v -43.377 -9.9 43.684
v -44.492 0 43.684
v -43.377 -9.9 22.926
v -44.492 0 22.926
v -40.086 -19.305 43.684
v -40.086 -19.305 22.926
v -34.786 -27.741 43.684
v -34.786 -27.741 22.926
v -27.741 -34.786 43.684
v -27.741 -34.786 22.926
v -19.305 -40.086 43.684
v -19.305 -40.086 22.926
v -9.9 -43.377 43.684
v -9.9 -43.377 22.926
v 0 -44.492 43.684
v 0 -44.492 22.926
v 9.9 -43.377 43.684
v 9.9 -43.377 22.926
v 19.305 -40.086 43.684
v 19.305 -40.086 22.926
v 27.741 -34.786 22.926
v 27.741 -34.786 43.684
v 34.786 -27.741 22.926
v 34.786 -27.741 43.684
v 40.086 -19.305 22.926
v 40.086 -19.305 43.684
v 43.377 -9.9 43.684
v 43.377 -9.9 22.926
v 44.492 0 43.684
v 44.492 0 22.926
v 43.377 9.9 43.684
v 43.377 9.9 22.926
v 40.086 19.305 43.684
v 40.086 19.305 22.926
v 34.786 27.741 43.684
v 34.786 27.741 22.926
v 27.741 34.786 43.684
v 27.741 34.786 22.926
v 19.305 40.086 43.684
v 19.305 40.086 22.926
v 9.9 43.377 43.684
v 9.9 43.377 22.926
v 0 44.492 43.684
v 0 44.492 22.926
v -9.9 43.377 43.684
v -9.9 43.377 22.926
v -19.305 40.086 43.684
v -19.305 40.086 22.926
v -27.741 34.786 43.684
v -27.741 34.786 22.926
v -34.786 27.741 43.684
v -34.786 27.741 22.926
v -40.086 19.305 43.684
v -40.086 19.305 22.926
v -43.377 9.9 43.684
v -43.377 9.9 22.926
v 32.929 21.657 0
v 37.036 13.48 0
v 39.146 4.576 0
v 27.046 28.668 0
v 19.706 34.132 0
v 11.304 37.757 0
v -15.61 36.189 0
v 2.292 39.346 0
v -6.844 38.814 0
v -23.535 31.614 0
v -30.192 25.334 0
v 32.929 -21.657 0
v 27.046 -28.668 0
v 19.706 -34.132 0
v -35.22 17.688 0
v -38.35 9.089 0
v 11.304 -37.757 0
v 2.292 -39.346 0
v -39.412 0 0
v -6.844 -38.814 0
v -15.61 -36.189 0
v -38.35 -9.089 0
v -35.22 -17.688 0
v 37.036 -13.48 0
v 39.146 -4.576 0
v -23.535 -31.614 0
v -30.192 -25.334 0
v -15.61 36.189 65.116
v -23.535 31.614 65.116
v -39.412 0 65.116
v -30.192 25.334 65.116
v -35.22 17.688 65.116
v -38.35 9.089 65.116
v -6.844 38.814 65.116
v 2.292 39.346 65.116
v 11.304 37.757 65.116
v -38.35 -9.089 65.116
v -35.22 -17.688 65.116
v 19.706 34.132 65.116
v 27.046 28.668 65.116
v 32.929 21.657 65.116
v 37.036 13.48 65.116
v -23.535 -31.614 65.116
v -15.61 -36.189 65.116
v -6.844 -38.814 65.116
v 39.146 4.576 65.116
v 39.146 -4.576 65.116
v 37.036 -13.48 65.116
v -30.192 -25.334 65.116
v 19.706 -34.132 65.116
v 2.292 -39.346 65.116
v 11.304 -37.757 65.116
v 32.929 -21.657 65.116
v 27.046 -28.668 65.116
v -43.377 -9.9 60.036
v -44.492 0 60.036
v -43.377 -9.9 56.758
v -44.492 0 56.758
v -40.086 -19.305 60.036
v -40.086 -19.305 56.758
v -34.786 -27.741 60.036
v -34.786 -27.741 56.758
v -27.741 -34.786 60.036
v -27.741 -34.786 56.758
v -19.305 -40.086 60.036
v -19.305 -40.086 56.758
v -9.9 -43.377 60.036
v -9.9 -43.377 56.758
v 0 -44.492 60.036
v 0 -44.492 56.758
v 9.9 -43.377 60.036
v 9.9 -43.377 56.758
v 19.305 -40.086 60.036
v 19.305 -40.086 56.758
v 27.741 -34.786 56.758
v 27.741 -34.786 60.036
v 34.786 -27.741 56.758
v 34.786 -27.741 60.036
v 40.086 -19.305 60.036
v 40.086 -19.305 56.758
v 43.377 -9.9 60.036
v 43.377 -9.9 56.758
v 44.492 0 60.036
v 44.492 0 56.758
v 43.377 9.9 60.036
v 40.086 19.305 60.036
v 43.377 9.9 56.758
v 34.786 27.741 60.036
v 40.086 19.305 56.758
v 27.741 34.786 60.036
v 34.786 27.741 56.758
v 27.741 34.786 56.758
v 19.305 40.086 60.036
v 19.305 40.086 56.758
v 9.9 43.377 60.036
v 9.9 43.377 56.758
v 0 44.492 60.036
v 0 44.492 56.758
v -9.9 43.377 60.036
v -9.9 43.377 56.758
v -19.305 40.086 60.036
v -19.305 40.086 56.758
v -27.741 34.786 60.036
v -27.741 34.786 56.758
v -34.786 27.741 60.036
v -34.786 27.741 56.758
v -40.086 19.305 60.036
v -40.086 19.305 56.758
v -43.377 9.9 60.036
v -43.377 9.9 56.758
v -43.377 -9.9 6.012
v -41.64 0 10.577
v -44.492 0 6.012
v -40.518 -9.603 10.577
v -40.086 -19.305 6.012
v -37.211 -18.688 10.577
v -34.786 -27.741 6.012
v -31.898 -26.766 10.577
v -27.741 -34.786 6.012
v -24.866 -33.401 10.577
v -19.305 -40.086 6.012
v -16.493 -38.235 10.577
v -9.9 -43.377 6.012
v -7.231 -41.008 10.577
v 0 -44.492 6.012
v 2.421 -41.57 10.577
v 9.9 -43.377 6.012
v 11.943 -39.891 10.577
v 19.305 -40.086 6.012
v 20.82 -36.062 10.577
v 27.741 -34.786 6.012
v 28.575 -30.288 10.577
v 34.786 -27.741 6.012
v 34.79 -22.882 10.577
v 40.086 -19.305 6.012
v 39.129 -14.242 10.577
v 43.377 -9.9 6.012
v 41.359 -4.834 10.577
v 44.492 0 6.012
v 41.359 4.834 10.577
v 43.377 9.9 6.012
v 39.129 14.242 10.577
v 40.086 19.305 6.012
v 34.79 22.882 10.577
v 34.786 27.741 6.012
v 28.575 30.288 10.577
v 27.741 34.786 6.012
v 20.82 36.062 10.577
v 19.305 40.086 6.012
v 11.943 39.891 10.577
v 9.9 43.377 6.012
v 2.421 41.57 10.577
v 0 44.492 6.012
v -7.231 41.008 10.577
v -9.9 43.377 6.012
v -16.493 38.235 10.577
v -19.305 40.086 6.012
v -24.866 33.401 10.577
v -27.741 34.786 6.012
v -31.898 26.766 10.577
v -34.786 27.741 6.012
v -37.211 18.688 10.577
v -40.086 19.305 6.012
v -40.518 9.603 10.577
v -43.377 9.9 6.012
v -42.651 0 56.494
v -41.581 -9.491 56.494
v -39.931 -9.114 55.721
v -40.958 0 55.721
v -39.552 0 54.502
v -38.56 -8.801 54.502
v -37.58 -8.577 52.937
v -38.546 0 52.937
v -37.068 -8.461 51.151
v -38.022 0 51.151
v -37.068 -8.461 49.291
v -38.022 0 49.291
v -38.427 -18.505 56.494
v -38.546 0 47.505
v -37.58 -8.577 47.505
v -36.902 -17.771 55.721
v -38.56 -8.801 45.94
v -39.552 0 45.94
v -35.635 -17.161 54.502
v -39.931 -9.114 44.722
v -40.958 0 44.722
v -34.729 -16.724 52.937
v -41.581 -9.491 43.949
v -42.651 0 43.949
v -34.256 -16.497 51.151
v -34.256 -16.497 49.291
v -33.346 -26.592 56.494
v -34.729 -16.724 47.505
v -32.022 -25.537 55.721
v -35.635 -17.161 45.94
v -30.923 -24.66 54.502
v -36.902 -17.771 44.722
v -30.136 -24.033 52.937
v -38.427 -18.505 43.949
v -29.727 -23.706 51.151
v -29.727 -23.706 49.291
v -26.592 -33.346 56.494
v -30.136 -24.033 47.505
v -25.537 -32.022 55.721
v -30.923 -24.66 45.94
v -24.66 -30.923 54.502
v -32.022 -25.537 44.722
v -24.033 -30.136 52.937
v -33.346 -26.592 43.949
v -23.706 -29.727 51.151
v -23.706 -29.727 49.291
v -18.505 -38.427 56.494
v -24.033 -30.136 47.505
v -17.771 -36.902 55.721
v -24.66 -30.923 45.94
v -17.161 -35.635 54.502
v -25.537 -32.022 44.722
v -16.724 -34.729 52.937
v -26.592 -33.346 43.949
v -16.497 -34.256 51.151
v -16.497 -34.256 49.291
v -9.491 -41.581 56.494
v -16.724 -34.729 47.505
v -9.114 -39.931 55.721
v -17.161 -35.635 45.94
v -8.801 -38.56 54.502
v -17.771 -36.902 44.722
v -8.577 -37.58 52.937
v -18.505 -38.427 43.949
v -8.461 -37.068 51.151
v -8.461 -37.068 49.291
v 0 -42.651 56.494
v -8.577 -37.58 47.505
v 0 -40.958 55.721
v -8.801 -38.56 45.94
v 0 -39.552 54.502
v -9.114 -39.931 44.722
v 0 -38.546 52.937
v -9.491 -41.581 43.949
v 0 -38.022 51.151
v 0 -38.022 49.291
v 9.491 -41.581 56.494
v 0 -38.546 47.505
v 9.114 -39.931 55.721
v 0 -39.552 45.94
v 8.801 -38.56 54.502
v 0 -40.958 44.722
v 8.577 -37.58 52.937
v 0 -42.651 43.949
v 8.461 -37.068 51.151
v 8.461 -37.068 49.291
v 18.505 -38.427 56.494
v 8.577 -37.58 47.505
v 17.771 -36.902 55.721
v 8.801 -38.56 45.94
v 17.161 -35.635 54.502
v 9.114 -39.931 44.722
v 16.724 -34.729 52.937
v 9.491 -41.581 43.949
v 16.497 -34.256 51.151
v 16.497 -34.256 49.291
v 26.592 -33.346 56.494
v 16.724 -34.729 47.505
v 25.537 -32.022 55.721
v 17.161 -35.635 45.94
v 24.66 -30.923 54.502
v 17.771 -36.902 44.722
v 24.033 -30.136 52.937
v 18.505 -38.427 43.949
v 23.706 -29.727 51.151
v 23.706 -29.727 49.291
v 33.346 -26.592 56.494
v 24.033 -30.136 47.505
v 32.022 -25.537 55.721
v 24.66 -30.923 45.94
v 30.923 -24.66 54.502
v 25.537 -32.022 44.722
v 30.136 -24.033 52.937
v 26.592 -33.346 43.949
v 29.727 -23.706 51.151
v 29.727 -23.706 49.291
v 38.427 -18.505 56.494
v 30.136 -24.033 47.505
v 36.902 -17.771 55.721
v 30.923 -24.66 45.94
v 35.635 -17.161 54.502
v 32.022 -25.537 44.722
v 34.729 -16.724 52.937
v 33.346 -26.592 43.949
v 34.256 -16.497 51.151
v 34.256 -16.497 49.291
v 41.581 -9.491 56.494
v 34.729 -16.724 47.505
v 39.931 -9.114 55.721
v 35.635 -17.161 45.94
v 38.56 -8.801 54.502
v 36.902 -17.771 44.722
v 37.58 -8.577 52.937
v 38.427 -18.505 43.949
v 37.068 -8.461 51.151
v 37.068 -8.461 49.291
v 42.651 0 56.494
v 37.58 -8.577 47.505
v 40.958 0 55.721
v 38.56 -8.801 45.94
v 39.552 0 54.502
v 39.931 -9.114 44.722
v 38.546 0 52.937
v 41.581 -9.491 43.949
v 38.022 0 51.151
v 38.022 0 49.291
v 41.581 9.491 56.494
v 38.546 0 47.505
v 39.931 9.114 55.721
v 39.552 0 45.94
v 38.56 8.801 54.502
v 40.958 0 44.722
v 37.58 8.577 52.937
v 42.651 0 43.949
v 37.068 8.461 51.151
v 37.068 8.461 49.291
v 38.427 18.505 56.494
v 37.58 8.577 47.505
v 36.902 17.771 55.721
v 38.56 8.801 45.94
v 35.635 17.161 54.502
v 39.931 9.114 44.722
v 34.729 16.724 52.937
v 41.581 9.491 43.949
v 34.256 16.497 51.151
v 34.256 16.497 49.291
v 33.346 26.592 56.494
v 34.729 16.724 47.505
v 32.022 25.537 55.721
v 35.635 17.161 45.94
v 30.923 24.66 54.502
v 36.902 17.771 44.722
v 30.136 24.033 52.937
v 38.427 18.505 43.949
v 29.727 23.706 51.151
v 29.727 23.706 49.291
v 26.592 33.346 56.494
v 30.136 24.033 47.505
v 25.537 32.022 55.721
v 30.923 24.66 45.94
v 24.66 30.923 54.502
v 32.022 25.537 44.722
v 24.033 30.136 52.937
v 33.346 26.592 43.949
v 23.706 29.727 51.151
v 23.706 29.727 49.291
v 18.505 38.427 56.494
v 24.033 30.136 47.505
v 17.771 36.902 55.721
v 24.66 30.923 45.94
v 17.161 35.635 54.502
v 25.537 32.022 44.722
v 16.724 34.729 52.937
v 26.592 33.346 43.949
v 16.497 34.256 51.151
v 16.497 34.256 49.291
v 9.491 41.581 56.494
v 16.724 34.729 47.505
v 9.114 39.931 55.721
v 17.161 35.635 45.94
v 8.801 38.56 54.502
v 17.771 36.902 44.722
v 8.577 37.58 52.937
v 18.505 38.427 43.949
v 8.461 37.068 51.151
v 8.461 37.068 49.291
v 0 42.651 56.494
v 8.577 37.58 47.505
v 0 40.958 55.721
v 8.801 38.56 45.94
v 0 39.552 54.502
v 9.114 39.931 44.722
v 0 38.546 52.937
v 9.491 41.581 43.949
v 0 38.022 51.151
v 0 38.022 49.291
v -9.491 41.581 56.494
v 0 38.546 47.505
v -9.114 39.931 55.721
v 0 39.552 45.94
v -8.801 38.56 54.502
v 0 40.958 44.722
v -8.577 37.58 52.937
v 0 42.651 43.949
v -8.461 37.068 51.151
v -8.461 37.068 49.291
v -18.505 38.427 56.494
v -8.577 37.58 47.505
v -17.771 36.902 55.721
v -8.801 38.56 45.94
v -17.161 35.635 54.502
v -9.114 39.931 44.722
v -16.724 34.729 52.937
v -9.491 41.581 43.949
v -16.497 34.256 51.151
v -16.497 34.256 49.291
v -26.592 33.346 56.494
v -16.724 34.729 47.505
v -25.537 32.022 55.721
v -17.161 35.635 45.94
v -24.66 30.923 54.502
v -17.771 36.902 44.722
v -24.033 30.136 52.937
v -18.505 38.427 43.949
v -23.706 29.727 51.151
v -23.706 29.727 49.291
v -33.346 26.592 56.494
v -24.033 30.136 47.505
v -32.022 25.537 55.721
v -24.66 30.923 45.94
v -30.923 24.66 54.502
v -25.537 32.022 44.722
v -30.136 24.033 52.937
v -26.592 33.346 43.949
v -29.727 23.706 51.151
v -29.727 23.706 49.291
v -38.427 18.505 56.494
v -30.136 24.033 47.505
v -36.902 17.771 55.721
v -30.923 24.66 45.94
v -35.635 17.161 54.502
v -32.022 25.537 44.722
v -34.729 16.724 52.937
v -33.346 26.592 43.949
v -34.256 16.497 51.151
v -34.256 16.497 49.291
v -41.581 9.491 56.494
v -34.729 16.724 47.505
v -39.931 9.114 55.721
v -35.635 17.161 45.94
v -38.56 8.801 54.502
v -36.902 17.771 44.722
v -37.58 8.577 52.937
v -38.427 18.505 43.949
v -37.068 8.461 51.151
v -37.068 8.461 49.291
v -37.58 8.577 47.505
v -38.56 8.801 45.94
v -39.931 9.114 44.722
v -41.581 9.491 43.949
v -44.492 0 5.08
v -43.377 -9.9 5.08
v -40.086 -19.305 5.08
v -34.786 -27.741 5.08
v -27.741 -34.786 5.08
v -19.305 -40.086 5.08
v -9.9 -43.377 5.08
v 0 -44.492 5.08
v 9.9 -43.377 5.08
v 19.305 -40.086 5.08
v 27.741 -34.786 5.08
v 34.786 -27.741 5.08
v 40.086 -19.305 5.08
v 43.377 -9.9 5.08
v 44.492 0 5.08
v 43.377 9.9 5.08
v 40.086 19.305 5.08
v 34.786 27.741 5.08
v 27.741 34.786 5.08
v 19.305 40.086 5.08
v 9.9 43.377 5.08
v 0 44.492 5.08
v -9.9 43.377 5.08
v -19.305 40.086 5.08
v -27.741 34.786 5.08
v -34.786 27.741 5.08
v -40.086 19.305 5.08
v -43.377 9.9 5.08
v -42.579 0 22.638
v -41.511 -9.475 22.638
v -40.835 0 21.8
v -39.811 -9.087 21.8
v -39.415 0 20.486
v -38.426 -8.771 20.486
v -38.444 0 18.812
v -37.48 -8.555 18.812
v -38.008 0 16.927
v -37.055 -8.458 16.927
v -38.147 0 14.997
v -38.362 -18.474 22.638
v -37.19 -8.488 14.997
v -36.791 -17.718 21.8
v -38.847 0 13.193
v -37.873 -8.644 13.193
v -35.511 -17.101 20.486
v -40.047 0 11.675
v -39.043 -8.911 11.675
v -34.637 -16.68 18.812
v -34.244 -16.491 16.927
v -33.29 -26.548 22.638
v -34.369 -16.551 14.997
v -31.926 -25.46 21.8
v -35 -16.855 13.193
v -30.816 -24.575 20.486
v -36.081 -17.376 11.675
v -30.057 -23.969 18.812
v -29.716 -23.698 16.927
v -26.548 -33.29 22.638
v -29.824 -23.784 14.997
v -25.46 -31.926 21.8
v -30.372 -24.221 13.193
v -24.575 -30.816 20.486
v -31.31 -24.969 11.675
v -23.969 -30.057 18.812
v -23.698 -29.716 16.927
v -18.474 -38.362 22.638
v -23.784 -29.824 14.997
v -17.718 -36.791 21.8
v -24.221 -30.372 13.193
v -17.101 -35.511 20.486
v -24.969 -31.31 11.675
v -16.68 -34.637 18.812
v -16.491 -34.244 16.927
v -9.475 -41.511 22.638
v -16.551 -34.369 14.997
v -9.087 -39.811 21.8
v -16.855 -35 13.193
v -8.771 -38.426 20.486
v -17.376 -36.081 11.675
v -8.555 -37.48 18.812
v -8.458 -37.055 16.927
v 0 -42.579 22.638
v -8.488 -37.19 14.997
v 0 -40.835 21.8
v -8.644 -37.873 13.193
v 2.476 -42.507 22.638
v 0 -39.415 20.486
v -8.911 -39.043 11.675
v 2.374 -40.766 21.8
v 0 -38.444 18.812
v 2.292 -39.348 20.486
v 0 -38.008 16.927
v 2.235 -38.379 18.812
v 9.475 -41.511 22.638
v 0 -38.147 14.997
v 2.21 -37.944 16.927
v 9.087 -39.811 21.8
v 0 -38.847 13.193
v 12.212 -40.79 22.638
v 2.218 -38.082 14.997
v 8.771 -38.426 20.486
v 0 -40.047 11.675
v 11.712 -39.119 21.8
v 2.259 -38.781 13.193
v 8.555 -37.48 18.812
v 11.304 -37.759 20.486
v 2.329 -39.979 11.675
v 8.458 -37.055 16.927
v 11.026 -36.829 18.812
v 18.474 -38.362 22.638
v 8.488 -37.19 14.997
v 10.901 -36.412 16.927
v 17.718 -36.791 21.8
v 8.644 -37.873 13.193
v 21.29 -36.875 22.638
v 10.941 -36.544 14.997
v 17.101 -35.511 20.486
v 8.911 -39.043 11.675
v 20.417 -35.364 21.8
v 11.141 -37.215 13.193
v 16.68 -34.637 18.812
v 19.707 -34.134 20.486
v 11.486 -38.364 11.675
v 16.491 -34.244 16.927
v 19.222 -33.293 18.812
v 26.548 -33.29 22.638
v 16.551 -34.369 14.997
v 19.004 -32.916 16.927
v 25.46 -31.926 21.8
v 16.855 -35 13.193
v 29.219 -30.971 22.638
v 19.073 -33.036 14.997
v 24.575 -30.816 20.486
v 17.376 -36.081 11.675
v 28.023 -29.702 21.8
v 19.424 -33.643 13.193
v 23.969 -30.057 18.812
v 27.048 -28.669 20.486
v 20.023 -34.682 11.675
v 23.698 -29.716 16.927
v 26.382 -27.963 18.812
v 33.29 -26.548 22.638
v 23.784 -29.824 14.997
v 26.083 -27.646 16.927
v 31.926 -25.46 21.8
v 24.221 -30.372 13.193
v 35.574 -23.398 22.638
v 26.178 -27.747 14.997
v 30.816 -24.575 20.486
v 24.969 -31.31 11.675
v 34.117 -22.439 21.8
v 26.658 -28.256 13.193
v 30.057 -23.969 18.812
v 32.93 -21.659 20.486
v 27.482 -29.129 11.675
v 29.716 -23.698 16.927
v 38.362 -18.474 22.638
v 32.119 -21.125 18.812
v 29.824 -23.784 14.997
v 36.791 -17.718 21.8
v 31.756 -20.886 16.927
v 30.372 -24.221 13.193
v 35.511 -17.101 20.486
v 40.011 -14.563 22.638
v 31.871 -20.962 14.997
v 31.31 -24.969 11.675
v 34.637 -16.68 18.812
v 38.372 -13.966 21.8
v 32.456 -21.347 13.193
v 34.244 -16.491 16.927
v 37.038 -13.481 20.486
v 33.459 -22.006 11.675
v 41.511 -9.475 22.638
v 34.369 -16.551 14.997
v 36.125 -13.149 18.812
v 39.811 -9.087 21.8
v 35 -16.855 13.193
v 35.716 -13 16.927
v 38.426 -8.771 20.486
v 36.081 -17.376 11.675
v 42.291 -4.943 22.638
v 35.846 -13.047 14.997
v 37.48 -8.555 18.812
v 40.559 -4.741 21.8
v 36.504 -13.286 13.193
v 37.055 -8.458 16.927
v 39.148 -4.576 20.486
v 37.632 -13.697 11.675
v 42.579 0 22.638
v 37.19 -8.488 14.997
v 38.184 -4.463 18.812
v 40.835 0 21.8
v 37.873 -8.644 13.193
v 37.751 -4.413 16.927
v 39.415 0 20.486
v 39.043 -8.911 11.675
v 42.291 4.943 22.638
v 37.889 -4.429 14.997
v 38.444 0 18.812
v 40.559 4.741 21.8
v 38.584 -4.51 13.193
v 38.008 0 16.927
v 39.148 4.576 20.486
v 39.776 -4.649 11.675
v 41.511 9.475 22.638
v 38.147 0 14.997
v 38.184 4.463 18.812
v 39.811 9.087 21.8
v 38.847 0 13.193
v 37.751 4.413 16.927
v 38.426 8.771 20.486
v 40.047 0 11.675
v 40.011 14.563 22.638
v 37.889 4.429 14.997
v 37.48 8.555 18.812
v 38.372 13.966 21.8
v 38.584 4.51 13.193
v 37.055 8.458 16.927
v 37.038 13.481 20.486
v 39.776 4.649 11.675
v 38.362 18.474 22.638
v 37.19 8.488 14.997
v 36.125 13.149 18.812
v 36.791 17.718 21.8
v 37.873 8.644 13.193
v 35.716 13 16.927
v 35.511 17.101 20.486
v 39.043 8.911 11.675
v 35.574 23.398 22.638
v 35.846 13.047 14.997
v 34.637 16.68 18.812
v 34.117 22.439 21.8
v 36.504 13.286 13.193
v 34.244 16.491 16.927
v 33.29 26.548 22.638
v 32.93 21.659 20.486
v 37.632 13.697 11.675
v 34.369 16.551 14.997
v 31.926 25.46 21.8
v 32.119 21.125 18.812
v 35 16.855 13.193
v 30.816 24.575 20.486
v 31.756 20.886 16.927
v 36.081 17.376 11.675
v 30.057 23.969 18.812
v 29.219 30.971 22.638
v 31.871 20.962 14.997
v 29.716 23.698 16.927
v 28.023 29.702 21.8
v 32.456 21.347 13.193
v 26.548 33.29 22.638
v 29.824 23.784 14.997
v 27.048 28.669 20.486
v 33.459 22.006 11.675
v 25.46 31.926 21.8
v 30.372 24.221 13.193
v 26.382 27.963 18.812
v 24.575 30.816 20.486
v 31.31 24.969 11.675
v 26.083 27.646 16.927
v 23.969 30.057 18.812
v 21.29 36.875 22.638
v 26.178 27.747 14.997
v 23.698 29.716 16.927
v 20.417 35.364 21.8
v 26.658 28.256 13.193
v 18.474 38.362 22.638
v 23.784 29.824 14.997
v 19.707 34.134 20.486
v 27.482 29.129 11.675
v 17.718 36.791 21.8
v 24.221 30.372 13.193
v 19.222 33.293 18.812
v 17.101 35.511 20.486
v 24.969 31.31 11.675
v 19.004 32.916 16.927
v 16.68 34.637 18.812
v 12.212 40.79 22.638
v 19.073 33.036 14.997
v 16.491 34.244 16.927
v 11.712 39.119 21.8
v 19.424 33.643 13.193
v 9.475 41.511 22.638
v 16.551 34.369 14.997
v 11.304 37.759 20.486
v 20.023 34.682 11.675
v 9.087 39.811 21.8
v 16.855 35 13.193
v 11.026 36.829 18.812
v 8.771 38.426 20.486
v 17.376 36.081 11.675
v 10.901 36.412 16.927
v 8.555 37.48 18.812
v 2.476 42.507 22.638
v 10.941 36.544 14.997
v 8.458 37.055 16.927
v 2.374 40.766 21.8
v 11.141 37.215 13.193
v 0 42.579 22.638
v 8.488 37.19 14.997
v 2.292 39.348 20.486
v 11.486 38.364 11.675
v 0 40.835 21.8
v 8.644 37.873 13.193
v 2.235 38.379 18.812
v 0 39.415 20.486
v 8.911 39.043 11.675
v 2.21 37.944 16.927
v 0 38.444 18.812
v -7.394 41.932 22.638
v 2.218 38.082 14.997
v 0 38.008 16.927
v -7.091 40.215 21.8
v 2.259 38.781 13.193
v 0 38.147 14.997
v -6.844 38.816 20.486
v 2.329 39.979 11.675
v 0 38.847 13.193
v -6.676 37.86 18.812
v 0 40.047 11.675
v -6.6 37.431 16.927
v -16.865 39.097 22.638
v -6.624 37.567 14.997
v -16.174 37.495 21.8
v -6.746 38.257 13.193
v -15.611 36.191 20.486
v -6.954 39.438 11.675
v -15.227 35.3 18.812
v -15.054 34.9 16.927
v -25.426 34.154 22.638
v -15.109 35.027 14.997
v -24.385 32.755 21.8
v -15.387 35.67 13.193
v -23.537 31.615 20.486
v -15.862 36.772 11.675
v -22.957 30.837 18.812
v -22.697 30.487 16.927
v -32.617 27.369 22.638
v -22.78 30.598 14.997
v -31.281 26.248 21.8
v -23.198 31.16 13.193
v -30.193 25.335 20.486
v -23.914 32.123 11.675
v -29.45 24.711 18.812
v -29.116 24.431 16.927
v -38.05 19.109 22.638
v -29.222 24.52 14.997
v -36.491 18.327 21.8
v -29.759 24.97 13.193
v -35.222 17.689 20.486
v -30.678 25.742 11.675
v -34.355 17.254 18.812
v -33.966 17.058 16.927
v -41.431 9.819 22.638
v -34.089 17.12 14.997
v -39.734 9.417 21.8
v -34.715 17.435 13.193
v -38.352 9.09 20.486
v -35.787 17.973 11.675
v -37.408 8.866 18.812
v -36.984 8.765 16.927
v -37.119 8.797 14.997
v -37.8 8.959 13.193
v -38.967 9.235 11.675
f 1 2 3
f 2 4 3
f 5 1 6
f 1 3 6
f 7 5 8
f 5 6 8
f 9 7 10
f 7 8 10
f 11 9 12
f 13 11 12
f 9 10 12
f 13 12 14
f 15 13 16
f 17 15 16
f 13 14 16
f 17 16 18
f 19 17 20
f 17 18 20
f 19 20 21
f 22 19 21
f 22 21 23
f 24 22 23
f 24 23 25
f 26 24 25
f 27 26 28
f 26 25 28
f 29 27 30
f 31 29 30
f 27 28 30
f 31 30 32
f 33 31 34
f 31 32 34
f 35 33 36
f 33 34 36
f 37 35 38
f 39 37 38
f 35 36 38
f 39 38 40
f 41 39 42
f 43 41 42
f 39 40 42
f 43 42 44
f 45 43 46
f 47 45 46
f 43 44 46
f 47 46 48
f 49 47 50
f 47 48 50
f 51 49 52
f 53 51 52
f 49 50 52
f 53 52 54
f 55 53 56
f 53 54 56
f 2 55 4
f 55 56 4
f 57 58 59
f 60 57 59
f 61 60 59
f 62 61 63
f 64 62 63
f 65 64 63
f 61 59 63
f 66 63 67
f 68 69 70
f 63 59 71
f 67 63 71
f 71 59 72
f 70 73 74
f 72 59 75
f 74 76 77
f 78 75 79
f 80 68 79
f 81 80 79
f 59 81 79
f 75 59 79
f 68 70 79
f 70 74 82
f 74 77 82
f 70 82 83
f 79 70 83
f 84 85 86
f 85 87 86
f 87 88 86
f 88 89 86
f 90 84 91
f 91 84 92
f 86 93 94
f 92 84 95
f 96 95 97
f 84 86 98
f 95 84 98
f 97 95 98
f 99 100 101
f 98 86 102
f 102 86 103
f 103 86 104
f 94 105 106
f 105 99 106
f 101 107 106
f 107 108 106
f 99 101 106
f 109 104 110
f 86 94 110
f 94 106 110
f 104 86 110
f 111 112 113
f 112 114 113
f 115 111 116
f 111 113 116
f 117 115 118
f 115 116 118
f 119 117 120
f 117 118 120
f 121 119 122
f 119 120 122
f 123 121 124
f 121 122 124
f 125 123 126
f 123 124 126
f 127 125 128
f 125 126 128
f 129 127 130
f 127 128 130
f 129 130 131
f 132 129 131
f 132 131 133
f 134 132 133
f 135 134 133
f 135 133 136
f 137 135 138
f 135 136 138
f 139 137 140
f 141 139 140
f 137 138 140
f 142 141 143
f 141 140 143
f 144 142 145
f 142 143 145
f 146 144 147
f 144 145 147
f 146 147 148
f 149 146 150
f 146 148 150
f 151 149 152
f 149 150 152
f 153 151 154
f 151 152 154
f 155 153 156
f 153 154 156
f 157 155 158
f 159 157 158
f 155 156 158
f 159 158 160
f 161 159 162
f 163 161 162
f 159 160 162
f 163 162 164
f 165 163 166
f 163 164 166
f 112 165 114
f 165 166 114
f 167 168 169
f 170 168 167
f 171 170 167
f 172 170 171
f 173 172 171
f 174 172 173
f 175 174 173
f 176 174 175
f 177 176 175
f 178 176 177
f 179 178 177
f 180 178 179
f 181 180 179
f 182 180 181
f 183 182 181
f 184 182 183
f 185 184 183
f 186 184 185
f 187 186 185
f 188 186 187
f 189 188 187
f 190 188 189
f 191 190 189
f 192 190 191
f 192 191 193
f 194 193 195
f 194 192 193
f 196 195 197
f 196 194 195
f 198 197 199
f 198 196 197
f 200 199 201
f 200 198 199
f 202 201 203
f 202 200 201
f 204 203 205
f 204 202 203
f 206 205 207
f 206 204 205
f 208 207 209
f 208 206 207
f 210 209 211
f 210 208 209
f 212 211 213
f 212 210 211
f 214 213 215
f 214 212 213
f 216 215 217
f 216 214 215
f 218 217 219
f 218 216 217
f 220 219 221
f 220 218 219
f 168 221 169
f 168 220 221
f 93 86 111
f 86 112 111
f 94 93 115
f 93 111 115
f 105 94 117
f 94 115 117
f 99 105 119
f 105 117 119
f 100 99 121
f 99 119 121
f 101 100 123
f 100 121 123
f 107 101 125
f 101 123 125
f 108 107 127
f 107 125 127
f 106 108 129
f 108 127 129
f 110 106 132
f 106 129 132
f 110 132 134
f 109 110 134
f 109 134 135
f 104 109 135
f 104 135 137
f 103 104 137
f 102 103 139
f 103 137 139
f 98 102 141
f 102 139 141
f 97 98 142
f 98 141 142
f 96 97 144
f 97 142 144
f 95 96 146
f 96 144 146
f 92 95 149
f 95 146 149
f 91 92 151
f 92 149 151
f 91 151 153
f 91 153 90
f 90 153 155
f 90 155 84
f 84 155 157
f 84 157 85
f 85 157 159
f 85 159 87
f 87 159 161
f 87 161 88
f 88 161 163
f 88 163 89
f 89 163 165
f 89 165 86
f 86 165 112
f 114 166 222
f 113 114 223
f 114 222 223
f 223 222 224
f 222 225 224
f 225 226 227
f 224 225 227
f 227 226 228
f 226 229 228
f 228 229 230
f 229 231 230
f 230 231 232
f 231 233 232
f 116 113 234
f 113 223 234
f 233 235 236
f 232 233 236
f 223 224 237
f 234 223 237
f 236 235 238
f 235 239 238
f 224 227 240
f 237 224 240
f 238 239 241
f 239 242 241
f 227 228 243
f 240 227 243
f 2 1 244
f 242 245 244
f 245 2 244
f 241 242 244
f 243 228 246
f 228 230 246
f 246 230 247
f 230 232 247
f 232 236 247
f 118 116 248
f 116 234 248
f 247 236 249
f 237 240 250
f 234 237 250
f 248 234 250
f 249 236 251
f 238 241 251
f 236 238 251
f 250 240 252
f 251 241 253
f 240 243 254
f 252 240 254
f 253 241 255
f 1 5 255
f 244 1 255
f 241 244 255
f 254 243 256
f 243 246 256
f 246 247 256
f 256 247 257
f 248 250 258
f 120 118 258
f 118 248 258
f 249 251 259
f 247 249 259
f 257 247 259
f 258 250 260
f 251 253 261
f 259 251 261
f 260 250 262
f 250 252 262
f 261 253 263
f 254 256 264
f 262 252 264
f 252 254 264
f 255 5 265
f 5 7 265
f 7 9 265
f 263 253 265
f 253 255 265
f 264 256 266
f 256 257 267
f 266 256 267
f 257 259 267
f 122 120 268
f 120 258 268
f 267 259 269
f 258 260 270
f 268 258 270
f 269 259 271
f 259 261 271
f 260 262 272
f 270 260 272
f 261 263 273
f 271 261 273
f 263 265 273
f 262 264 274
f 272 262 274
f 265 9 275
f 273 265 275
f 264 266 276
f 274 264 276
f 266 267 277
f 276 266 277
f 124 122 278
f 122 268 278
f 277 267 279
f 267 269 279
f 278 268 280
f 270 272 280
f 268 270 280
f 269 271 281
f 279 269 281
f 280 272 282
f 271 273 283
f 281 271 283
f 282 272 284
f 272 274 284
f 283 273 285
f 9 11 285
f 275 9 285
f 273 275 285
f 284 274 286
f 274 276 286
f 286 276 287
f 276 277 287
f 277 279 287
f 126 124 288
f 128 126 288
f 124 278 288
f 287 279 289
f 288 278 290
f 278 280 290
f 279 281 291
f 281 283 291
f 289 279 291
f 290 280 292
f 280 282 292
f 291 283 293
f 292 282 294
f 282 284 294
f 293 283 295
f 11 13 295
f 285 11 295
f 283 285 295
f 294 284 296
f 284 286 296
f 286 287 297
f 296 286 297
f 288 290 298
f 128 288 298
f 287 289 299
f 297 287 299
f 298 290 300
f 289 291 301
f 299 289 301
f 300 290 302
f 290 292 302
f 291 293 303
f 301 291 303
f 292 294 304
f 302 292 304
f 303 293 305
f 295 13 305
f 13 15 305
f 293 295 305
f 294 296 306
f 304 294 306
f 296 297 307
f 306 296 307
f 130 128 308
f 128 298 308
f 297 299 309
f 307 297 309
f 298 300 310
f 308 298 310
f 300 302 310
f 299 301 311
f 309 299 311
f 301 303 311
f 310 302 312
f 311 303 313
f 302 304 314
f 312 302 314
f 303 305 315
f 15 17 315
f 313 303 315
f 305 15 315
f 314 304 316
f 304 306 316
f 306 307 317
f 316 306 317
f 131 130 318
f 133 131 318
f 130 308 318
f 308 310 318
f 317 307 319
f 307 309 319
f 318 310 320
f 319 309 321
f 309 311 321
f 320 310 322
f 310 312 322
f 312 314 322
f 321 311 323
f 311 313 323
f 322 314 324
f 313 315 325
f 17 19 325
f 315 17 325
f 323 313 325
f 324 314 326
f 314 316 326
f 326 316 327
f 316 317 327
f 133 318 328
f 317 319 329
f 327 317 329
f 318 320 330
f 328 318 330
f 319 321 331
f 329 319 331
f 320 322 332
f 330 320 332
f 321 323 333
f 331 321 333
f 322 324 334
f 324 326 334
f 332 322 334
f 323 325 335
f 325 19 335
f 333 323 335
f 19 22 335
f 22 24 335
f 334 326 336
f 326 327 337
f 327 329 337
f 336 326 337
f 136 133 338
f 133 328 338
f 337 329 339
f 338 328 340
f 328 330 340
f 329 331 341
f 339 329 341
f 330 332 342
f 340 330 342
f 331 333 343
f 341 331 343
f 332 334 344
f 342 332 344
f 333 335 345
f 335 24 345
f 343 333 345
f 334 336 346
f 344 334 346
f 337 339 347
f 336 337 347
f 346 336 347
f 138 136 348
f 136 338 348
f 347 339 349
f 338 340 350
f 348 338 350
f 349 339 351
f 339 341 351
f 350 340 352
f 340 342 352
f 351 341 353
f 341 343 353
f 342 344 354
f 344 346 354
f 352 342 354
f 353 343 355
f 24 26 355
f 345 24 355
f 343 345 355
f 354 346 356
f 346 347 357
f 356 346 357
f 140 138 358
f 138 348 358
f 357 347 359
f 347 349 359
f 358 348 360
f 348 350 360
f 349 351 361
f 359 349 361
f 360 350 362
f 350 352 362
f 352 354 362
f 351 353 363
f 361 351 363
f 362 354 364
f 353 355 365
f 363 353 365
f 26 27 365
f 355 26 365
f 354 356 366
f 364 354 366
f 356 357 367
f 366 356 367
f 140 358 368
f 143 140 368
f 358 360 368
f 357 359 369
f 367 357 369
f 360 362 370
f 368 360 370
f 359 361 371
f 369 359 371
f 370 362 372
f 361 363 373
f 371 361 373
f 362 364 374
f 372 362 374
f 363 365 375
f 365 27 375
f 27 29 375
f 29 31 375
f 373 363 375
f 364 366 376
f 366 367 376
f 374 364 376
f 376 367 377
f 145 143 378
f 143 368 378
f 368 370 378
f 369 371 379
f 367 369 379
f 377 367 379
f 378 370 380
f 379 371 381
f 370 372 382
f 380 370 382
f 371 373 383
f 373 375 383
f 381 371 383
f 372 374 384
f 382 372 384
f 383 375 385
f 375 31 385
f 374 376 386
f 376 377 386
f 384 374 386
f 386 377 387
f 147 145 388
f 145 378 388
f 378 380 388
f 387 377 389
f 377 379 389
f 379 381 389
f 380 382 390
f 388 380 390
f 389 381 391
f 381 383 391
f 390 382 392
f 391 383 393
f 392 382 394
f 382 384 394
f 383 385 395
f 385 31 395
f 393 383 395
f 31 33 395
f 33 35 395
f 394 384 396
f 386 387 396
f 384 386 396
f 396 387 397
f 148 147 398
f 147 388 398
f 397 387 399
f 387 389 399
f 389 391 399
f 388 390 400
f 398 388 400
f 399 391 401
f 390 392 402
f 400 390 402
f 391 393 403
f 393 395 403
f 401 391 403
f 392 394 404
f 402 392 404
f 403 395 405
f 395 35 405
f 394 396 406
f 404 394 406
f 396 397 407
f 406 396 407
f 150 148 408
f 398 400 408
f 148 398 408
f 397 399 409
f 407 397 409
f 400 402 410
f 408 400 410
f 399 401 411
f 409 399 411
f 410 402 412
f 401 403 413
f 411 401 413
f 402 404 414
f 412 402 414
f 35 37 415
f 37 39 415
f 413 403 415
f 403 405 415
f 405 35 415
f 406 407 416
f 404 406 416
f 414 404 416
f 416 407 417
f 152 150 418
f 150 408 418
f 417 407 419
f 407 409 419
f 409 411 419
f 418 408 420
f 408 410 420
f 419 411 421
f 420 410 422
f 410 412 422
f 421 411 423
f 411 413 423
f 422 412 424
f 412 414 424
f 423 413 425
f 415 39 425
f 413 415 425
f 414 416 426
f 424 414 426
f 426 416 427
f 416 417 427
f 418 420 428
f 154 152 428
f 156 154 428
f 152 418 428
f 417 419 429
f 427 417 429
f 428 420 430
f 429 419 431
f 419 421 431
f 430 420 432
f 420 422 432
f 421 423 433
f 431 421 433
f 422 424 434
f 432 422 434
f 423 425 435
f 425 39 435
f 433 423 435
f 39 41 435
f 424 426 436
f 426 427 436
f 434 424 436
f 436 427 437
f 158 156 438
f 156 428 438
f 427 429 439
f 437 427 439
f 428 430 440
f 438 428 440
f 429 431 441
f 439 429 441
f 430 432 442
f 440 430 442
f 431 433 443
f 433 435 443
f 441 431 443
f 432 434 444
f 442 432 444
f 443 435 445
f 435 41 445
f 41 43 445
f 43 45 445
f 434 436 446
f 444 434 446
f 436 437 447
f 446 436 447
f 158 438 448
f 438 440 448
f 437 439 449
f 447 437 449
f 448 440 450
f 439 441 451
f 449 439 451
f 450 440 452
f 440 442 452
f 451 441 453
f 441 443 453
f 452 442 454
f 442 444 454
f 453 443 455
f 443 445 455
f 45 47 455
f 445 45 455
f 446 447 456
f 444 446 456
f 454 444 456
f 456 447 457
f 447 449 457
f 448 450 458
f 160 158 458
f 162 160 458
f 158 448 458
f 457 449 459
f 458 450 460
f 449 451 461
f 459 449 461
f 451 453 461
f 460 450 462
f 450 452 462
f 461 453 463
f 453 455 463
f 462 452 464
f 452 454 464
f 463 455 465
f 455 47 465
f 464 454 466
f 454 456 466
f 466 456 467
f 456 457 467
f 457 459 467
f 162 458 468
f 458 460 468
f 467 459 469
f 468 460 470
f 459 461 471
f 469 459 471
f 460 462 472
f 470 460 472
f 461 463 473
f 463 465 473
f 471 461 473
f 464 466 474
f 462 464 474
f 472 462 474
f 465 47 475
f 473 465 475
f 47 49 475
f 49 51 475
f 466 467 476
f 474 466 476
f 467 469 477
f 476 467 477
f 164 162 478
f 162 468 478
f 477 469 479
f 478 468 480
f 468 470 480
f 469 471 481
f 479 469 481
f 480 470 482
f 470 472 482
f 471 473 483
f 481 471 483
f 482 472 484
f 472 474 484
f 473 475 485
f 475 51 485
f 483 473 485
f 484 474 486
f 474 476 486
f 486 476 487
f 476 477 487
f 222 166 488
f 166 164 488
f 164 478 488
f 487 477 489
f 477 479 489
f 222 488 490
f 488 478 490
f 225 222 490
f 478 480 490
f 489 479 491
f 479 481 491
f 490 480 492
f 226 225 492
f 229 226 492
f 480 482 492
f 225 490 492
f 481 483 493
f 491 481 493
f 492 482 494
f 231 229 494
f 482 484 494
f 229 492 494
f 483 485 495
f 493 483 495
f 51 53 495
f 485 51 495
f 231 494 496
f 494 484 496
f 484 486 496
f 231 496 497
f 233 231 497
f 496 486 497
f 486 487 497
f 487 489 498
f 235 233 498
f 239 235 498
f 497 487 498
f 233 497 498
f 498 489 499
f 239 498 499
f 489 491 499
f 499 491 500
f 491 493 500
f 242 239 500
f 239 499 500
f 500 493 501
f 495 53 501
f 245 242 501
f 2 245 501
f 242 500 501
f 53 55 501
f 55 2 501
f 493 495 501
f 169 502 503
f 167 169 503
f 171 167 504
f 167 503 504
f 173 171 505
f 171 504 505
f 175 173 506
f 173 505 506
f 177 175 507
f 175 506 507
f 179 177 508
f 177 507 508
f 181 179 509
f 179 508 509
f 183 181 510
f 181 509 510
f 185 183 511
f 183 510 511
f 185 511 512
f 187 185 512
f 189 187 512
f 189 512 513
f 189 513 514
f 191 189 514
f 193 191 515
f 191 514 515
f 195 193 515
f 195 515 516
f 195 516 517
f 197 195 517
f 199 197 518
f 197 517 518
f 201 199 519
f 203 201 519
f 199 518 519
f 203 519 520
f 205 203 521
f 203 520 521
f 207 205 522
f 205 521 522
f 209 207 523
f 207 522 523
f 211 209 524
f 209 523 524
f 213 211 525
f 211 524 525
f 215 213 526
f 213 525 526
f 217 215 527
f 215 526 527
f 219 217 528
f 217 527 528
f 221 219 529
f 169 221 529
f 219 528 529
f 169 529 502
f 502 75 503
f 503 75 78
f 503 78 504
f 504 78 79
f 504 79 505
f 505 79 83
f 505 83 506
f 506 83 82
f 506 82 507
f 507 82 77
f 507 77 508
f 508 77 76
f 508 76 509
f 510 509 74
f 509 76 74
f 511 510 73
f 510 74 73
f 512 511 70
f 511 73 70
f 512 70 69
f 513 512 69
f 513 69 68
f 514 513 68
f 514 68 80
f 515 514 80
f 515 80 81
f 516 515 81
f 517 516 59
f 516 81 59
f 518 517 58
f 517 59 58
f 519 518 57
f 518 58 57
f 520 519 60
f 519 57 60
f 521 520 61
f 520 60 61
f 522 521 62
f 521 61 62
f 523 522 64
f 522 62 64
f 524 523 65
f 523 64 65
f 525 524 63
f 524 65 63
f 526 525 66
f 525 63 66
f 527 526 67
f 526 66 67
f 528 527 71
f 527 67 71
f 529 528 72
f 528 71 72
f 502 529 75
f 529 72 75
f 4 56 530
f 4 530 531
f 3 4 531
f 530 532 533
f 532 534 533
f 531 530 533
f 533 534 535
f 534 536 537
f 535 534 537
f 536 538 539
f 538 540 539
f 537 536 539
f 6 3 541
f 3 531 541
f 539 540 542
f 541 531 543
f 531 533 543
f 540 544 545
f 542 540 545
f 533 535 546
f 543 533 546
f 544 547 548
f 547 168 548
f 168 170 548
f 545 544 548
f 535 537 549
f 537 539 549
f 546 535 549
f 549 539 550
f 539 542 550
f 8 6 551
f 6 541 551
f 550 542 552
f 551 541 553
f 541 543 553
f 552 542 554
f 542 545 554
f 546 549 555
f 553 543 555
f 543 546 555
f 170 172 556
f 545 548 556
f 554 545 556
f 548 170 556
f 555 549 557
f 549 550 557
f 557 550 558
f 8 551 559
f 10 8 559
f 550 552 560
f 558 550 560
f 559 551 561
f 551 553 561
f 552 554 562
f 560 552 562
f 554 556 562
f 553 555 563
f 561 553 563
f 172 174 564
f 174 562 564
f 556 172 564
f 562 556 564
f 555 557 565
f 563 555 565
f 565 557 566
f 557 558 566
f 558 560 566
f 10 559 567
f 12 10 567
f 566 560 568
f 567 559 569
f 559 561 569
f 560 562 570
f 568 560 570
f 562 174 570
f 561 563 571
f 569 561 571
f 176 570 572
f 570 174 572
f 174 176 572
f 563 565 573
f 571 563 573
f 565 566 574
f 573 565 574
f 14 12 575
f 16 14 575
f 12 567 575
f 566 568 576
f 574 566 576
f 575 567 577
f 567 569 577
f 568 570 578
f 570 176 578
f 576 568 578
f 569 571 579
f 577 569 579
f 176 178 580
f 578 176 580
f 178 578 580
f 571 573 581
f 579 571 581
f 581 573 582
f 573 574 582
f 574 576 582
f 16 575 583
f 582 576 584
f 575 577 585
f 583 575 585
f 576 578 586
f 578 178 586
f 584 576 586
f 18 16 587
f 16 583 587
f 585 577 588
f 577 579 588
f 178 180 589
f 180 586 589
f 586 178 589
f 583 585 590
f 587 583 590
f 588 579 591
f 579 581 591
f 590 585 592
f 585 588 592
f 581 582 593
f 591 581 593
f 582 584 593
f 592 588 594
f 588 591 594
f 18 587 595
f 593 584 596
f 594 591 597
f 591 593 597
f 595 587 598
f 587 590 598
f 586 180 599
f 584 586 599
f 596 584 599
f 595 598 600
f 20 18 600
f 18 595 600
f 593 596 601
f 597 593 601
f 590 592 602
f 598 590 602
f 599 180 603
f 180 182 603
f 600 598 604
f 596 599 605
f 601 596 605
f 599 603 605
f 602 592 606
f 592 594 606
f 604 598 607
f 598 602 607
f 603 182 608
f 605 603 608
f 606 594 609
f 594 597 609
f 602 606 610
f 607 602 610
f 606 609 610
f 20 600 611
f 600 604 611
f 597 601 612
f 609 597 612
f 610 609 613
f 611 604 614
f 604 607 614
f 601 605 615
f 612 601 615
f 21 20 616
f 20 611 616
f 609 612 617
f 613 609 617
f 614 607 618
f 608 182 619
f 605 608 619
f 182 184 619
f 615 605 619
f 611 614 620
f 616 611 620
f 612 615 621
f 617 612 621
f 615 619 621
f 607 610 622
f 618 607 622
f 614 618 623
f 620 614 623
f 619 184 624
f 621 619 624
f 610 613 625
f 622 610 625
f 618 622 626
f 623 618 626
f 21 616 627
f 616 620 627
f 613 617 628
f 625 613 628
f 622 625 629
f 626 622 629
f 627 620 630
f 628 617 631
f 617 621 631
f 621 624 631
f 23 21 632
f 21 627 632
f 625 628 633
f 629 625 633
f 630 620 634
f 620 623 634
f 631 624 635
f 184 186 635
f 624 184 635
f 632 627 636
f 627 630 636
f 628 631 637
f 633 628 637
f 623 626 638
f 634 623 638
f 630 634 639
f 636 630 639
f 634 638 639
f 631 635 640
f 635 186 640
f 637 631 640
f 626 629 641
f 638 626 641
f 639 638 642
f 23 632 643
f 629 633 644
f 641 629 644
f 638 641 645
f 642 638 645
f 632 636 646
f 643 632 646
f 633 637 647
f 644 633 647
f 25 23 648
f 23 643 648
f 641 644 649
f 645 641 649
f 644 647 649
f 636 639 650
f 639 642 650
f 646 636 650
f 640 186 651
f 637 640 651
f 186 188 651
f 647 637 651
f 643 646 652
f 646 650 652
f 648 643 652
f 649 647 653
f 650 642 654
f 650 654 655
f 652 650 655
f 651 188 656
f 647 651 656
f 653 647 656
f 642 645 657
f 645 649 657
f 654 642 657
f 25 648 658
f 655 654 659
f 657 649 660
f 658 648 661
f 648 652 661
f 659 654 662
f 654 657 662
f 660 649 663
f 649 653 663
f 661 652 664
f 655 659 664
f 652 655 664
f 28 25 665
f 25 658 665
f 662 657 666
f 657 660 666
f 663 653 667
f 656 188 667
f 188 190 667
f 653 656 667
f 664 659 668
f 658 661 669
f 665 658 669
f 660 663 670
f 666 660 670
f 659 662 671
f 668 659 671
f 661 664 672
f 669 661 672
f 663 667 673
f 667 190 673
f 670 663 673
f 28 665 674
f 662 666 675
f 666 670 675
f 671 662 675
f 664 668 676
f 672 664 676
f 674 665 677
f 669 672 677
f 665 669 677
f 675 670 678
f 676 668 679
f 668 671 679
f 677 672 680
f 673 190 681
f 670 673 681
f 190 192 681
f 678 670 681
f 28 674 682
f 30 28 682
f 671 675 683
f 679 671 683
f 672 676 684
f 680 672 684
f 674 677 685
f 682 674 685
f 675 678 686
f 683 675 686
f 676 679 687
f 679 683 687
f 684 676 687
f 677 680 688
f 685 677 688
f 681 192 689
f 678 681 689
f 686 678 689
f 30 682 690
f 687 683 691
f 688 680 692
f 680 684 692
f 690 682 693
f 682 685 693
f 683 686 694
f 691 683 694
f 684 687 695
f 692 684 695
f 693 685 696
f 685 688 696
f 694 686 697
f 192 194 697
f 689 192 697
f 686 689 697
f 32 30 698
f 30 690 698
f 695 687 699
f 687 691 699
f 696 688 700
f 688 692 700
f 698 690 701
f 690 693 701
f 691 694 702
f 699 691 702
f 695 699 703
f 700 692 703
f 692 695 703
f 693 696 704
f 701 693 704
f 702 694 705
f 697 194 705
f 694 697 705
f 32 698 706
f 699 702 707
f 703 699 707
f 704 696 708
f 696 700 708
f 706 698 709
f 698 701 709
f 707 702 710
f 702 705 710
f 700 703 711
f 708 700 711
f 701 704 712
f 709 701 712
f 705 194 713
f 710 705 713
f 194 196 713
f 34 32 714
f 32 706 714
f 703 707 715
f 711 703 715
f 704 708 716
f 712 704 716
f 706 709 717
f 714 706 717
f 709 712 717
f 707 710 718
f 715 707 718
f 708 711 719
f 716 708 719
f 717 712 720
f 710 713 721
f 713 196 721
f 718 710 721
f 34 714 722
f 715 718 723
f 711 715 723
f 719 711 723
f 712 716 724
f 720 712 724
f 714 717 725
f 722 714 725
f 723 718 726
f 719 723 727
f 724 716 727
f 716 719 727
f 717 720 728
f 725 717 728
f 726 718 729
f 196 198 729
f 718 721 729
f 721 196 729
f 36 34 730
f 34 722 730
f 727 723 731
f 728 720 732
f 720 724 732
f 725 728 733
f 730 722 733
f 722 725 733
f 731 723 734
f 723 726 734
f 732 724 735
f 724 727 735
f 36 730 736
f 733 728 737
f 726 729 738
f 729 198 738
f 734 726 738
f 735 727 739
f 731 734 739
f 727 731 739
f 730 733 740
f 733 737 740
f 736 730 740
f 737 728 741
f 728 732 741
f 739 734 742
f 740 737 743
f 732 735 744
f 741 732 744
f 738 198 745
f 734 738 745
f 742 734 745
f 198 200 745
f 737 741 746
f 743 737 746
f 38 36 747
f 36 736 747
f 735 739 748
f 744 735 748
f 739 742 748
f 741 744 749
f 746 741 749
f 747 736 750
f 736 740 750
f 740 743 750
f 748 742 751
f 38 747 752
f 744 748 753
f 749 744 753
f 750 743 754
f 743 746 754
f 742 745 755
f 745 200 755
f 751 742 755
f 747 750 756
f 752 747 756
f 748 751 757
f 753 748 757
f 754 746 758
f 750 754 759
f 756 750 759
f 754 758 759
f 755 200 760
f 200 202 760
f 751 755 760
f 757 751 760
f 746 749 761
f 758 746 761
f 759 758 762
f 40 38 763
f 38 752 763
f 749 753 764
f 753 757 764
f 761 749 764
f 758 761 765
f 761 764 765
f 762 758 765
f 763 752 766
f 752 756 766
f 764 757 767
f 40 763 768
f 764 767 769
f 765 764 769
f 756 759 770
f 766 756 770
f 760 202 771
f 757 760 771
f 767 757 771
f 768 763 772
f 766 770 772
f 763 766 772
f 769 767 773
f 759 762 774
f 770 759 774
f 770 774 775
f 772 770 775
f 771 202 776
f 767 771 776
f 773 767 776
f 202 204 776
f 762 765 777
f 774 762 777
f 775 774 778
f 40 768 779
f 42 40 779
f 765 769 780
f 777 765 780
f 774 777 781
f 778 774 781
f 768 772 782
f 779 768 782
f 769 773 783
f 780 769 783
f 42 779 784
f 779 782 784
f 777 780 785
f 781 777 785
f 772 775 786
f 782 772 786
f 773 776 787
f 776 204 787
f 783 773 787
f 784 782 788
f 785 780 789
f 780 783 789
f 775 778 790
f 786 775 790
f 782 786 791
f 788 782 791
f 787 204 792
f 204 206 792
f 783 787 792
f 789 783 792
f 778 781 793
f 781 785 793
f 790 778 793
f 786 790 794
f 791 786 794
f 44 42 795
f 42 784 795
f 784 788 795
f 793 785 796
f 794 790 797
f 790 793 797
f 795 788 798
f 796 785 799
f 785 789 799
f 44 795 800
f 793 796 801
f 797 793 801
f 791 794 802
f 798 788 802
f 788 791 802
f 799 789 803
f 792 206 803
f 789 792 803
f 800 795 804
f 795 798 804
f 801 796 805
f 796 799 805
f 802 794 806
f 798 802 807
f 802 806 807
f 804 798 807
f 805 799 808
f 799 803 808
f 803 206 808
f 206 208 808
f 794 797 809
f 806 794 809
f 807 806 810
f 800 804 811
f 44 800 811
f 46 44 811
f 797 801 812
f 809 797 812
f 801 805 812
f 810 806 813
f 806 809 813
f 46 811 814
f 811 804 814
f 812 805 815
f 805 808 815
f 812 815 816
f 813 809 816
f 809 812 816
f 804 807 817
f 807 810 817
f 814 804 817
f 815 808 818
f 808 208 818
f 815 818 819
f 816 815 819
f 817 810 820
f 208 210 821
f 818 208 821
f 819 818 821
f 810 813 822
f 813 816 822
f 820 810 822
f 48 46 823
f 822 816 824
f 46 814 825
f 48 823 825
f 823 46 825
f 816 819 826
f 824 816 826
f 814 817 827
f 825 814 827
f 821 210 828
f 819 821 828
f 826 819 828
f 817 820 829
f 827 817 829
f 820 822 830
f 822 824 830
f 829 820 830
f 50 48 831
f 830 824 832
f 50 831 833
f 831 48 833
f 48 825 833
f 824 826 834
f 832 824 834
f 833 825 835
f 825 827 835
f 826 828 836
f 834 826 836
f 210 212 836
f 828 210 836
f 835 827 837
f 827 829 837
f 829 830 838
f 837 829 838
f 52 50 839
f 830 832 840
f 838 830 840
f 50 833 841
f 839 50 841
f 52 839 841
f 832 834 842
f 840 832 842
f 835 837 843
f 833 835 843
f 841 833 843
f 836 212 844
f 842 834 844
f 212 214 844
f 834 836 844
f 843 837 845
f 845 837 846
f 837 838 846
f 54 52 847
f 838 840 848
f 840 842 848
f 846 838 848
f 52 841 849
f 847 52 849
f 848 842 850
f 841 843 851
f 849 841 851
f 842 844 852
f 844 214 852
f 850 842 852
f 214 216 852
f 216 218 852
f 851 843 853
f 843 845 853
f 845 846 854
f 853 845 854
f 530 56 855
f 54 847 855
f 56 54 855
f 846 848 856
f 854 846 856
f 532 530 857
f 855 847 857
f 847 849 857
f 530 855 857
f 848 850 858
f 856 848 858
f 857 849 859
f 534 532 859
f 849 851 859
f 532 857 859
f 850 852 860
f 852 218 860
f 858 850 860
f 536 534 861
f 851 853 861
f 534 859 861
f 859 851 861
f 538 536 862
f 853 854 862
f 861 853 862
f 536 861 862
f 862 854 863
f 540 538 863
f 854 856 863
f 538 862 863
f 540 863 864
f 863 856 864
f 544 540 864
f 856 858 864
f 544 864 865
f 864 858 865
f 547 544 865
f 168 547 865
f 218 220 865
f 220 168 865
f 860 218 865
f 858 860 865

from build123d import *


# Not quite as in the source:
# - a fillet or chamfer that OpenCascade refuses, or shapes differently, is made with other operations: its cross-section is extruded or revolved along the edge and cut away or added


with BuildPart() as f1:
    # F0 (on Front) → F1 (revolve)
    with BuildSketch(Plane.XZ):
        with BuildLine():
            Line((-44.4924347103, 0), (0, 0))
            Line((0, 0), (0, 65.1155337691))
            Line((0, 65.1155337691), (-44.4924347103, 65.1155337691))
            Line((-44.4924347103, 65.1155337691), (-44.4924347103, 56.7583087614))
            ThreePointArc((-44.4924347103, 56.7583087614), (-37.9552003214, 50.2210743725), (-44.4924347103, 43.6838399837))
            Line((-44.4924347103, 43.6838399837), (-44.4924347103, 22.9257815758))
            ThreePointArc((-44.4924347103, 22.9257815758), (-37.9887534996, 16.4221003652), (-44.4924347103, 9.9184191545))
            Line((-44.4924347103, 9.9184191545), (-44.4924347103, 0))
        make_face()
    revolve(axis=Axis((0, 0, 32.5577668846), (0, 0, 1)))

    # F2: chamfer of 5.08 on 4 edges, made by hand

    # F2_s1 → F2_t2 (revolve, cut)
    with BuildSketch(Plane.XZ):
        Polygon((-39.4124347103, 65.1155337691), (-44.4924347103, 60.0355337691), (-44.4924347103, 65.1155337691), align=None)
    revolve(axis=Axis((0, 0, 65.1155337691), (0, 0, 1)), mode=Mode.SUBTRACT)

    # F2_s3 → F2_t4 (revolve, cut)
    with BuildSketch(Plane.XZ):
        with BuildLine():
            Line((-44.4924347103, 6.0117559717), (-41.6402584505, 10.5771914803))
            ThreePointArc((-41.6402584505, 10.5771914803), (-42.9562364784, 10.1024513019), (-44.4924347103, 9.9184191545))
            Line((-44.4924347103, 9.9184191545), (-44.4924347103, 6.0117559717))
        make_face()
    revolve(axis=Axis((0, 0, 9.9184191545), (0, 0, 1)), mode=Mode.SUBTRACT)

    # F2_s5 → F2_t6 (revolve, cut)
    with BuildSketch(Plane.XZ):
        Polygon((-44.4924347103, 5.08), (-39.4124347103, 0), (-44.4924347103, 0), align=None)
    revolve(axis=Axis((0, 0, 0), (0, 0, 1)), mode=Mode.SUBTRACT)


solid = f1.part
